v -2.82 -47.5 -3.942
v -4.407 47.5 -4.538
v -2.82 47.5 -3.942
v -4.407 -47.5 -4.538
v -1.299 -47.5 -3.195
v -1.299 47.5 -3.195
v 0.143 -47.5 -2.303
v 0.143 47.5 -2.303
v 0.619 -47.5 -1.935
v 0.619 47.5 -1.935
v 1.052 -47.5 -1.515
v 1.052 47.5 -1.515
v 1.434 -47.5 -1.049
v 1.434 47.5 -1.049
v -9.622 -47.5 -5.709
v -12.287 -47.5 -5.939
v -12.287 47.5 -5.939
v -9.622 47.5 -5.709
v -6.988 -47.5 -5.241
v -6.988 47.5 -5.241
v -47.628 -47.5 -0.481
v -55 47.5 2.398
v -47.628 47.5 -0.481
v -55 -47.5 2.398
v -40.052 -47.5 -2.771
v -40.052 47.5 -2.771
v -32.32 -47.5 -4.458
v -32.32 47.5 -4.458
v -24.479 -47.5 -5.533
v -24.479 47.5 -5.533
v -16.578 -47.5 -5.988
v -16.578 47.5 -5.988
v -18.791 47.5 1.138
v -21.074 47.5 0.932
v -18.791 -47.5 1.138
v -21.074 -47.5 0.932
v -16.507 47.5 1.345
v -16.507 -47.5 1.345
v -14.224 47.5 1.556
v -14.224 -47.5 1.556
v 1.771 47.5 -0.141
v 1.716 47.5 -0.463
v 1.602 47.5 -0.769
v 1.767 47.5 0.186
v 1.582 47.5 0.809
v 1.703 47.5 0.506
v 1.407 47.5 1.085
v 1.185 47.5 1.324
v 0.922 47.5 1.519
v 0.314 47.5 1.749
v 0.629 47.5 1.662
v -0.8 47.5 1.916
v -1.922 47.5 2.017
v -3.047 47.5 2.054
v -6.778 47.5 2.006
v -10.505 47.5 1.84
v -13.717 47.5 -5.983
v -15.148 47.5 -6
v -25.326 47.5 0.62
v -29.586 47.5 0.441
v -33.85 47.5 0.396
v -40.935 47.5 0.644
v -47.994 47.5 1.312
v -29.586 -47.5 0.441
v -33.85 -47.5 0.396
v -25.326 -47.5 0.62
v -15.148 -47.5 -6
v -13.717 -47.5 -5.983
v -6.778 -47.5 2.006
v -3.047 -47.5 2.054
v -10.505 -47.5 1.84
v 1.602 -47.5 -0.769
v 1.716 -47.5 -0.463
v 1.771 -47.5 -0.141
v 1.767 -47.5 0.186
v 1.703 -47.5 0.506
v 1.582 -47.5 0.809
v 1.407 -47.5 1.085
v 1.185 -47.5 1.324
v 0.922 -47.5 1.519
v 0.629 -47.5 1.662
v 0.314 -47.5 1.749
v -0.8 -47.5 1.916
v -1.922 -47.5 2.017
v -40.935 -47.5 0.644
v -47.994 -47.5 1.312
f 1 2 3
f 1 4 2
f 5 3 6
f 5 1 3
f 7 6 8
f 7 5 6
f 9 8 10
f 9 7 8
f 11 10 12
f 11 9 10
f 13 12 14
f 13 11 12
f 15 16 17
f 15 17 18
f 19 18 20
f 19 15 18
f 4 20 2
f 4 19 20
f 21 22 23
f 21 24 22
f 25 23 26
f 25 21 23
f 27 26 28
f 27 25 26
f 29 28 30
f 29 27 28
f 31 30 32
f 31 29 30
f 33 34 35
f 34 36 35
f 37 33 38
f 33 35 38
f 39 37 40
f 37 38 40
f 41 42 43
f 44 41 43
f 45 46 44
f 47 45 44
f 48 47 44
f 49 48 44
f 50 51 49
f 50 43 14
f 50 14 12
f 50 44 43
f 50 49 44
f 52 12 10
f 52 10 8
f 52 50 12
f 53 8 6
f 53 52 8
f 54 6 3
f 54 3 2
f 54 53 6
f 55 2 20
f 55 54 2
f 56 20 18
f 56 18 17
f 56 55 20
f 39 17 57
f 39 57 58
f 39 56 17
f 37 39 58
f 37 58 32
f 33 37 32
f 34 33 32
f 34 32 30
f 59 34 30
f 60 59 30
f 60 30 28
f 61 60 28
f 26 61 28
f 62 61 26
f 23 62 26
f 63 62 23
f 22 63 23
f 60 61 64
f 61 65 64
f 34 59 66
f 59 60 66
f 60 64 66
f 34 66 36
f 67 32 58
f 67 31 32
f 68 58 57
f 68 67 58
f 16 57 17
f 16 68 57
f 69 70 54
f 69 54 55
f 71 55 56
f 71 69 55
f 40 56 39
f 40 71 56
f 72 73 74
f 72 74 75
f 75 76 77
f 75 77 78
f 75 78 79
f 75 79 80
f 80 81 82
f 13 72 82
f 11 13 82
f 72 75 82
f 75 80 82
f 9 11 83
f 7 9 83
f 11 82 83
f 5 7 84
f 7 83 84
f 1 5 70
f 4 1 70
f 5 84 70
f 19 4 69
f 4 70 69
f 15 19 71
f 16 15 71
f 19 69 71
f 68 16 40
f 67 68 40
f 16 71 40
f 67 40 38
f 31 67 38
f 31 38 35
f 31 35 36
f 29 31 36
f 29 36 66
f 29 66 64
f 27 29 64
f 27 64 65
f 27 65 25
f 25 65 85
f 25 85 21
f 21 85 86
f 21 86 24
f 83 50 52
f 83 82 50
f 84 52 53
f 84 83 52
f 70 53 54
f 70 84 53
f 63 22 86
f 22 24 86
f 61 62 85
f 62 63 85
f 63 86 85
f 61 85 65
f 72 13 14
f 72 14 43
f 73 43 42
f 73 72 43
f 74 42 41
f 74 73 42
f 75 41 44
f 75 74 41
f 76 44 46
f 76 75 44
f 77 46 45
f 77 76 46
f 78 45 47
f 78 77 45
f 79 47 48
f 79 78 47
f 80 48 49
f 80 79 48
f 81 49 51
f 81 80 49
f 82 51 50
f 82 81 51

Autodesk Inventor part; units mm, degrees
ref_plane "YZ Plane" through (0, 0, 0) normal (1, 0, 0) x (0, 1, 0)
ref_plane "XZ Plane" through (0, 0, 0) normal (0, 1, 0) x (-1, 0, 0)
ref_plane "XY Plane" through (0, 0, 0) normal (0, 0, 1) x (1, 0, 0)
sketch "スケッチ1" plane through (0, 0, 0) normal (0, 1, 0) x (-1, 0, 0)
  arc A0 (-0.3139, 1.7491) -> (-1.4341, -1.0494) centre (0, 0) ccw
  arc A1 (3.0473, 2.0538) -> (-0.3139, 1.7491) centre (3.11, -17.328) ccw
  arc A2 (14.2243, 1.5555) -> (3.0473, 2.0538) centre (3.426, -115.066) ccw
  arc A3 (14.2243, 1.5555) -> (21.0741, 0.9324) centre (210.779, 2124.35) ccw
  arc A4 (21.0741, 0.9324) -> (33.8498, 0.3962) centre (33.144, 136.034) ccw
  arc A5 (33.8498, 0.3962) -> (55, 2.3978) centre (33.229, 119.698) ccw
  arc A6 (-1.4341, -1.0494) -> (-0.1426, -2.3034) centre (2.9, 2.122) ccw
  arc A7 (-0.1426, -2.3034) -> (4.4066, -4.5379) centre (9.743, 12.075) ccw
  arc A8 (4.4066, -4.5379) -> (12.2873, -5.9387) centre (13.508, 23.796) ccw
  arc A9 (12.2873, -5.9387) -> (16.5781, -5.9878) centre (15.261, 66.497) ccw
  arc A10 (16.5781, -5.9878) -> (55, 2.3978) centre (14.7503, 94.6026) ccw
  dimension "d0" = 1.777
  dimension "d2" = 17.328
  dimension "d5" = 115.066
  dimension "d7" = 2124.35
  dimension "d9" = 136.034
  dimension "d10" = 3.11
  dimension "d11" = 3.426
  dimension "d12" = 210.779
  dimension "d13" = 33.144
  dimension "d14" = 33.229
  dimension "d15" = 119.698
  dimension "d16" = 55
  dimension "d17" = 2.9
  dimension "d18" = 2.122
  dimension "d21" = 9.743
  dimension "d22" = 12.075
  dimension "d23" = 13.508
  dimension "d24" = 23.796
  dimension "d25" = 15.261
  dimension "d26" = 66.497
  dimension "d27" = 94.6026
extrude "押し出し1" add sketch "スケッチ1" along normal mid plane 95
properties part number "naca97"
